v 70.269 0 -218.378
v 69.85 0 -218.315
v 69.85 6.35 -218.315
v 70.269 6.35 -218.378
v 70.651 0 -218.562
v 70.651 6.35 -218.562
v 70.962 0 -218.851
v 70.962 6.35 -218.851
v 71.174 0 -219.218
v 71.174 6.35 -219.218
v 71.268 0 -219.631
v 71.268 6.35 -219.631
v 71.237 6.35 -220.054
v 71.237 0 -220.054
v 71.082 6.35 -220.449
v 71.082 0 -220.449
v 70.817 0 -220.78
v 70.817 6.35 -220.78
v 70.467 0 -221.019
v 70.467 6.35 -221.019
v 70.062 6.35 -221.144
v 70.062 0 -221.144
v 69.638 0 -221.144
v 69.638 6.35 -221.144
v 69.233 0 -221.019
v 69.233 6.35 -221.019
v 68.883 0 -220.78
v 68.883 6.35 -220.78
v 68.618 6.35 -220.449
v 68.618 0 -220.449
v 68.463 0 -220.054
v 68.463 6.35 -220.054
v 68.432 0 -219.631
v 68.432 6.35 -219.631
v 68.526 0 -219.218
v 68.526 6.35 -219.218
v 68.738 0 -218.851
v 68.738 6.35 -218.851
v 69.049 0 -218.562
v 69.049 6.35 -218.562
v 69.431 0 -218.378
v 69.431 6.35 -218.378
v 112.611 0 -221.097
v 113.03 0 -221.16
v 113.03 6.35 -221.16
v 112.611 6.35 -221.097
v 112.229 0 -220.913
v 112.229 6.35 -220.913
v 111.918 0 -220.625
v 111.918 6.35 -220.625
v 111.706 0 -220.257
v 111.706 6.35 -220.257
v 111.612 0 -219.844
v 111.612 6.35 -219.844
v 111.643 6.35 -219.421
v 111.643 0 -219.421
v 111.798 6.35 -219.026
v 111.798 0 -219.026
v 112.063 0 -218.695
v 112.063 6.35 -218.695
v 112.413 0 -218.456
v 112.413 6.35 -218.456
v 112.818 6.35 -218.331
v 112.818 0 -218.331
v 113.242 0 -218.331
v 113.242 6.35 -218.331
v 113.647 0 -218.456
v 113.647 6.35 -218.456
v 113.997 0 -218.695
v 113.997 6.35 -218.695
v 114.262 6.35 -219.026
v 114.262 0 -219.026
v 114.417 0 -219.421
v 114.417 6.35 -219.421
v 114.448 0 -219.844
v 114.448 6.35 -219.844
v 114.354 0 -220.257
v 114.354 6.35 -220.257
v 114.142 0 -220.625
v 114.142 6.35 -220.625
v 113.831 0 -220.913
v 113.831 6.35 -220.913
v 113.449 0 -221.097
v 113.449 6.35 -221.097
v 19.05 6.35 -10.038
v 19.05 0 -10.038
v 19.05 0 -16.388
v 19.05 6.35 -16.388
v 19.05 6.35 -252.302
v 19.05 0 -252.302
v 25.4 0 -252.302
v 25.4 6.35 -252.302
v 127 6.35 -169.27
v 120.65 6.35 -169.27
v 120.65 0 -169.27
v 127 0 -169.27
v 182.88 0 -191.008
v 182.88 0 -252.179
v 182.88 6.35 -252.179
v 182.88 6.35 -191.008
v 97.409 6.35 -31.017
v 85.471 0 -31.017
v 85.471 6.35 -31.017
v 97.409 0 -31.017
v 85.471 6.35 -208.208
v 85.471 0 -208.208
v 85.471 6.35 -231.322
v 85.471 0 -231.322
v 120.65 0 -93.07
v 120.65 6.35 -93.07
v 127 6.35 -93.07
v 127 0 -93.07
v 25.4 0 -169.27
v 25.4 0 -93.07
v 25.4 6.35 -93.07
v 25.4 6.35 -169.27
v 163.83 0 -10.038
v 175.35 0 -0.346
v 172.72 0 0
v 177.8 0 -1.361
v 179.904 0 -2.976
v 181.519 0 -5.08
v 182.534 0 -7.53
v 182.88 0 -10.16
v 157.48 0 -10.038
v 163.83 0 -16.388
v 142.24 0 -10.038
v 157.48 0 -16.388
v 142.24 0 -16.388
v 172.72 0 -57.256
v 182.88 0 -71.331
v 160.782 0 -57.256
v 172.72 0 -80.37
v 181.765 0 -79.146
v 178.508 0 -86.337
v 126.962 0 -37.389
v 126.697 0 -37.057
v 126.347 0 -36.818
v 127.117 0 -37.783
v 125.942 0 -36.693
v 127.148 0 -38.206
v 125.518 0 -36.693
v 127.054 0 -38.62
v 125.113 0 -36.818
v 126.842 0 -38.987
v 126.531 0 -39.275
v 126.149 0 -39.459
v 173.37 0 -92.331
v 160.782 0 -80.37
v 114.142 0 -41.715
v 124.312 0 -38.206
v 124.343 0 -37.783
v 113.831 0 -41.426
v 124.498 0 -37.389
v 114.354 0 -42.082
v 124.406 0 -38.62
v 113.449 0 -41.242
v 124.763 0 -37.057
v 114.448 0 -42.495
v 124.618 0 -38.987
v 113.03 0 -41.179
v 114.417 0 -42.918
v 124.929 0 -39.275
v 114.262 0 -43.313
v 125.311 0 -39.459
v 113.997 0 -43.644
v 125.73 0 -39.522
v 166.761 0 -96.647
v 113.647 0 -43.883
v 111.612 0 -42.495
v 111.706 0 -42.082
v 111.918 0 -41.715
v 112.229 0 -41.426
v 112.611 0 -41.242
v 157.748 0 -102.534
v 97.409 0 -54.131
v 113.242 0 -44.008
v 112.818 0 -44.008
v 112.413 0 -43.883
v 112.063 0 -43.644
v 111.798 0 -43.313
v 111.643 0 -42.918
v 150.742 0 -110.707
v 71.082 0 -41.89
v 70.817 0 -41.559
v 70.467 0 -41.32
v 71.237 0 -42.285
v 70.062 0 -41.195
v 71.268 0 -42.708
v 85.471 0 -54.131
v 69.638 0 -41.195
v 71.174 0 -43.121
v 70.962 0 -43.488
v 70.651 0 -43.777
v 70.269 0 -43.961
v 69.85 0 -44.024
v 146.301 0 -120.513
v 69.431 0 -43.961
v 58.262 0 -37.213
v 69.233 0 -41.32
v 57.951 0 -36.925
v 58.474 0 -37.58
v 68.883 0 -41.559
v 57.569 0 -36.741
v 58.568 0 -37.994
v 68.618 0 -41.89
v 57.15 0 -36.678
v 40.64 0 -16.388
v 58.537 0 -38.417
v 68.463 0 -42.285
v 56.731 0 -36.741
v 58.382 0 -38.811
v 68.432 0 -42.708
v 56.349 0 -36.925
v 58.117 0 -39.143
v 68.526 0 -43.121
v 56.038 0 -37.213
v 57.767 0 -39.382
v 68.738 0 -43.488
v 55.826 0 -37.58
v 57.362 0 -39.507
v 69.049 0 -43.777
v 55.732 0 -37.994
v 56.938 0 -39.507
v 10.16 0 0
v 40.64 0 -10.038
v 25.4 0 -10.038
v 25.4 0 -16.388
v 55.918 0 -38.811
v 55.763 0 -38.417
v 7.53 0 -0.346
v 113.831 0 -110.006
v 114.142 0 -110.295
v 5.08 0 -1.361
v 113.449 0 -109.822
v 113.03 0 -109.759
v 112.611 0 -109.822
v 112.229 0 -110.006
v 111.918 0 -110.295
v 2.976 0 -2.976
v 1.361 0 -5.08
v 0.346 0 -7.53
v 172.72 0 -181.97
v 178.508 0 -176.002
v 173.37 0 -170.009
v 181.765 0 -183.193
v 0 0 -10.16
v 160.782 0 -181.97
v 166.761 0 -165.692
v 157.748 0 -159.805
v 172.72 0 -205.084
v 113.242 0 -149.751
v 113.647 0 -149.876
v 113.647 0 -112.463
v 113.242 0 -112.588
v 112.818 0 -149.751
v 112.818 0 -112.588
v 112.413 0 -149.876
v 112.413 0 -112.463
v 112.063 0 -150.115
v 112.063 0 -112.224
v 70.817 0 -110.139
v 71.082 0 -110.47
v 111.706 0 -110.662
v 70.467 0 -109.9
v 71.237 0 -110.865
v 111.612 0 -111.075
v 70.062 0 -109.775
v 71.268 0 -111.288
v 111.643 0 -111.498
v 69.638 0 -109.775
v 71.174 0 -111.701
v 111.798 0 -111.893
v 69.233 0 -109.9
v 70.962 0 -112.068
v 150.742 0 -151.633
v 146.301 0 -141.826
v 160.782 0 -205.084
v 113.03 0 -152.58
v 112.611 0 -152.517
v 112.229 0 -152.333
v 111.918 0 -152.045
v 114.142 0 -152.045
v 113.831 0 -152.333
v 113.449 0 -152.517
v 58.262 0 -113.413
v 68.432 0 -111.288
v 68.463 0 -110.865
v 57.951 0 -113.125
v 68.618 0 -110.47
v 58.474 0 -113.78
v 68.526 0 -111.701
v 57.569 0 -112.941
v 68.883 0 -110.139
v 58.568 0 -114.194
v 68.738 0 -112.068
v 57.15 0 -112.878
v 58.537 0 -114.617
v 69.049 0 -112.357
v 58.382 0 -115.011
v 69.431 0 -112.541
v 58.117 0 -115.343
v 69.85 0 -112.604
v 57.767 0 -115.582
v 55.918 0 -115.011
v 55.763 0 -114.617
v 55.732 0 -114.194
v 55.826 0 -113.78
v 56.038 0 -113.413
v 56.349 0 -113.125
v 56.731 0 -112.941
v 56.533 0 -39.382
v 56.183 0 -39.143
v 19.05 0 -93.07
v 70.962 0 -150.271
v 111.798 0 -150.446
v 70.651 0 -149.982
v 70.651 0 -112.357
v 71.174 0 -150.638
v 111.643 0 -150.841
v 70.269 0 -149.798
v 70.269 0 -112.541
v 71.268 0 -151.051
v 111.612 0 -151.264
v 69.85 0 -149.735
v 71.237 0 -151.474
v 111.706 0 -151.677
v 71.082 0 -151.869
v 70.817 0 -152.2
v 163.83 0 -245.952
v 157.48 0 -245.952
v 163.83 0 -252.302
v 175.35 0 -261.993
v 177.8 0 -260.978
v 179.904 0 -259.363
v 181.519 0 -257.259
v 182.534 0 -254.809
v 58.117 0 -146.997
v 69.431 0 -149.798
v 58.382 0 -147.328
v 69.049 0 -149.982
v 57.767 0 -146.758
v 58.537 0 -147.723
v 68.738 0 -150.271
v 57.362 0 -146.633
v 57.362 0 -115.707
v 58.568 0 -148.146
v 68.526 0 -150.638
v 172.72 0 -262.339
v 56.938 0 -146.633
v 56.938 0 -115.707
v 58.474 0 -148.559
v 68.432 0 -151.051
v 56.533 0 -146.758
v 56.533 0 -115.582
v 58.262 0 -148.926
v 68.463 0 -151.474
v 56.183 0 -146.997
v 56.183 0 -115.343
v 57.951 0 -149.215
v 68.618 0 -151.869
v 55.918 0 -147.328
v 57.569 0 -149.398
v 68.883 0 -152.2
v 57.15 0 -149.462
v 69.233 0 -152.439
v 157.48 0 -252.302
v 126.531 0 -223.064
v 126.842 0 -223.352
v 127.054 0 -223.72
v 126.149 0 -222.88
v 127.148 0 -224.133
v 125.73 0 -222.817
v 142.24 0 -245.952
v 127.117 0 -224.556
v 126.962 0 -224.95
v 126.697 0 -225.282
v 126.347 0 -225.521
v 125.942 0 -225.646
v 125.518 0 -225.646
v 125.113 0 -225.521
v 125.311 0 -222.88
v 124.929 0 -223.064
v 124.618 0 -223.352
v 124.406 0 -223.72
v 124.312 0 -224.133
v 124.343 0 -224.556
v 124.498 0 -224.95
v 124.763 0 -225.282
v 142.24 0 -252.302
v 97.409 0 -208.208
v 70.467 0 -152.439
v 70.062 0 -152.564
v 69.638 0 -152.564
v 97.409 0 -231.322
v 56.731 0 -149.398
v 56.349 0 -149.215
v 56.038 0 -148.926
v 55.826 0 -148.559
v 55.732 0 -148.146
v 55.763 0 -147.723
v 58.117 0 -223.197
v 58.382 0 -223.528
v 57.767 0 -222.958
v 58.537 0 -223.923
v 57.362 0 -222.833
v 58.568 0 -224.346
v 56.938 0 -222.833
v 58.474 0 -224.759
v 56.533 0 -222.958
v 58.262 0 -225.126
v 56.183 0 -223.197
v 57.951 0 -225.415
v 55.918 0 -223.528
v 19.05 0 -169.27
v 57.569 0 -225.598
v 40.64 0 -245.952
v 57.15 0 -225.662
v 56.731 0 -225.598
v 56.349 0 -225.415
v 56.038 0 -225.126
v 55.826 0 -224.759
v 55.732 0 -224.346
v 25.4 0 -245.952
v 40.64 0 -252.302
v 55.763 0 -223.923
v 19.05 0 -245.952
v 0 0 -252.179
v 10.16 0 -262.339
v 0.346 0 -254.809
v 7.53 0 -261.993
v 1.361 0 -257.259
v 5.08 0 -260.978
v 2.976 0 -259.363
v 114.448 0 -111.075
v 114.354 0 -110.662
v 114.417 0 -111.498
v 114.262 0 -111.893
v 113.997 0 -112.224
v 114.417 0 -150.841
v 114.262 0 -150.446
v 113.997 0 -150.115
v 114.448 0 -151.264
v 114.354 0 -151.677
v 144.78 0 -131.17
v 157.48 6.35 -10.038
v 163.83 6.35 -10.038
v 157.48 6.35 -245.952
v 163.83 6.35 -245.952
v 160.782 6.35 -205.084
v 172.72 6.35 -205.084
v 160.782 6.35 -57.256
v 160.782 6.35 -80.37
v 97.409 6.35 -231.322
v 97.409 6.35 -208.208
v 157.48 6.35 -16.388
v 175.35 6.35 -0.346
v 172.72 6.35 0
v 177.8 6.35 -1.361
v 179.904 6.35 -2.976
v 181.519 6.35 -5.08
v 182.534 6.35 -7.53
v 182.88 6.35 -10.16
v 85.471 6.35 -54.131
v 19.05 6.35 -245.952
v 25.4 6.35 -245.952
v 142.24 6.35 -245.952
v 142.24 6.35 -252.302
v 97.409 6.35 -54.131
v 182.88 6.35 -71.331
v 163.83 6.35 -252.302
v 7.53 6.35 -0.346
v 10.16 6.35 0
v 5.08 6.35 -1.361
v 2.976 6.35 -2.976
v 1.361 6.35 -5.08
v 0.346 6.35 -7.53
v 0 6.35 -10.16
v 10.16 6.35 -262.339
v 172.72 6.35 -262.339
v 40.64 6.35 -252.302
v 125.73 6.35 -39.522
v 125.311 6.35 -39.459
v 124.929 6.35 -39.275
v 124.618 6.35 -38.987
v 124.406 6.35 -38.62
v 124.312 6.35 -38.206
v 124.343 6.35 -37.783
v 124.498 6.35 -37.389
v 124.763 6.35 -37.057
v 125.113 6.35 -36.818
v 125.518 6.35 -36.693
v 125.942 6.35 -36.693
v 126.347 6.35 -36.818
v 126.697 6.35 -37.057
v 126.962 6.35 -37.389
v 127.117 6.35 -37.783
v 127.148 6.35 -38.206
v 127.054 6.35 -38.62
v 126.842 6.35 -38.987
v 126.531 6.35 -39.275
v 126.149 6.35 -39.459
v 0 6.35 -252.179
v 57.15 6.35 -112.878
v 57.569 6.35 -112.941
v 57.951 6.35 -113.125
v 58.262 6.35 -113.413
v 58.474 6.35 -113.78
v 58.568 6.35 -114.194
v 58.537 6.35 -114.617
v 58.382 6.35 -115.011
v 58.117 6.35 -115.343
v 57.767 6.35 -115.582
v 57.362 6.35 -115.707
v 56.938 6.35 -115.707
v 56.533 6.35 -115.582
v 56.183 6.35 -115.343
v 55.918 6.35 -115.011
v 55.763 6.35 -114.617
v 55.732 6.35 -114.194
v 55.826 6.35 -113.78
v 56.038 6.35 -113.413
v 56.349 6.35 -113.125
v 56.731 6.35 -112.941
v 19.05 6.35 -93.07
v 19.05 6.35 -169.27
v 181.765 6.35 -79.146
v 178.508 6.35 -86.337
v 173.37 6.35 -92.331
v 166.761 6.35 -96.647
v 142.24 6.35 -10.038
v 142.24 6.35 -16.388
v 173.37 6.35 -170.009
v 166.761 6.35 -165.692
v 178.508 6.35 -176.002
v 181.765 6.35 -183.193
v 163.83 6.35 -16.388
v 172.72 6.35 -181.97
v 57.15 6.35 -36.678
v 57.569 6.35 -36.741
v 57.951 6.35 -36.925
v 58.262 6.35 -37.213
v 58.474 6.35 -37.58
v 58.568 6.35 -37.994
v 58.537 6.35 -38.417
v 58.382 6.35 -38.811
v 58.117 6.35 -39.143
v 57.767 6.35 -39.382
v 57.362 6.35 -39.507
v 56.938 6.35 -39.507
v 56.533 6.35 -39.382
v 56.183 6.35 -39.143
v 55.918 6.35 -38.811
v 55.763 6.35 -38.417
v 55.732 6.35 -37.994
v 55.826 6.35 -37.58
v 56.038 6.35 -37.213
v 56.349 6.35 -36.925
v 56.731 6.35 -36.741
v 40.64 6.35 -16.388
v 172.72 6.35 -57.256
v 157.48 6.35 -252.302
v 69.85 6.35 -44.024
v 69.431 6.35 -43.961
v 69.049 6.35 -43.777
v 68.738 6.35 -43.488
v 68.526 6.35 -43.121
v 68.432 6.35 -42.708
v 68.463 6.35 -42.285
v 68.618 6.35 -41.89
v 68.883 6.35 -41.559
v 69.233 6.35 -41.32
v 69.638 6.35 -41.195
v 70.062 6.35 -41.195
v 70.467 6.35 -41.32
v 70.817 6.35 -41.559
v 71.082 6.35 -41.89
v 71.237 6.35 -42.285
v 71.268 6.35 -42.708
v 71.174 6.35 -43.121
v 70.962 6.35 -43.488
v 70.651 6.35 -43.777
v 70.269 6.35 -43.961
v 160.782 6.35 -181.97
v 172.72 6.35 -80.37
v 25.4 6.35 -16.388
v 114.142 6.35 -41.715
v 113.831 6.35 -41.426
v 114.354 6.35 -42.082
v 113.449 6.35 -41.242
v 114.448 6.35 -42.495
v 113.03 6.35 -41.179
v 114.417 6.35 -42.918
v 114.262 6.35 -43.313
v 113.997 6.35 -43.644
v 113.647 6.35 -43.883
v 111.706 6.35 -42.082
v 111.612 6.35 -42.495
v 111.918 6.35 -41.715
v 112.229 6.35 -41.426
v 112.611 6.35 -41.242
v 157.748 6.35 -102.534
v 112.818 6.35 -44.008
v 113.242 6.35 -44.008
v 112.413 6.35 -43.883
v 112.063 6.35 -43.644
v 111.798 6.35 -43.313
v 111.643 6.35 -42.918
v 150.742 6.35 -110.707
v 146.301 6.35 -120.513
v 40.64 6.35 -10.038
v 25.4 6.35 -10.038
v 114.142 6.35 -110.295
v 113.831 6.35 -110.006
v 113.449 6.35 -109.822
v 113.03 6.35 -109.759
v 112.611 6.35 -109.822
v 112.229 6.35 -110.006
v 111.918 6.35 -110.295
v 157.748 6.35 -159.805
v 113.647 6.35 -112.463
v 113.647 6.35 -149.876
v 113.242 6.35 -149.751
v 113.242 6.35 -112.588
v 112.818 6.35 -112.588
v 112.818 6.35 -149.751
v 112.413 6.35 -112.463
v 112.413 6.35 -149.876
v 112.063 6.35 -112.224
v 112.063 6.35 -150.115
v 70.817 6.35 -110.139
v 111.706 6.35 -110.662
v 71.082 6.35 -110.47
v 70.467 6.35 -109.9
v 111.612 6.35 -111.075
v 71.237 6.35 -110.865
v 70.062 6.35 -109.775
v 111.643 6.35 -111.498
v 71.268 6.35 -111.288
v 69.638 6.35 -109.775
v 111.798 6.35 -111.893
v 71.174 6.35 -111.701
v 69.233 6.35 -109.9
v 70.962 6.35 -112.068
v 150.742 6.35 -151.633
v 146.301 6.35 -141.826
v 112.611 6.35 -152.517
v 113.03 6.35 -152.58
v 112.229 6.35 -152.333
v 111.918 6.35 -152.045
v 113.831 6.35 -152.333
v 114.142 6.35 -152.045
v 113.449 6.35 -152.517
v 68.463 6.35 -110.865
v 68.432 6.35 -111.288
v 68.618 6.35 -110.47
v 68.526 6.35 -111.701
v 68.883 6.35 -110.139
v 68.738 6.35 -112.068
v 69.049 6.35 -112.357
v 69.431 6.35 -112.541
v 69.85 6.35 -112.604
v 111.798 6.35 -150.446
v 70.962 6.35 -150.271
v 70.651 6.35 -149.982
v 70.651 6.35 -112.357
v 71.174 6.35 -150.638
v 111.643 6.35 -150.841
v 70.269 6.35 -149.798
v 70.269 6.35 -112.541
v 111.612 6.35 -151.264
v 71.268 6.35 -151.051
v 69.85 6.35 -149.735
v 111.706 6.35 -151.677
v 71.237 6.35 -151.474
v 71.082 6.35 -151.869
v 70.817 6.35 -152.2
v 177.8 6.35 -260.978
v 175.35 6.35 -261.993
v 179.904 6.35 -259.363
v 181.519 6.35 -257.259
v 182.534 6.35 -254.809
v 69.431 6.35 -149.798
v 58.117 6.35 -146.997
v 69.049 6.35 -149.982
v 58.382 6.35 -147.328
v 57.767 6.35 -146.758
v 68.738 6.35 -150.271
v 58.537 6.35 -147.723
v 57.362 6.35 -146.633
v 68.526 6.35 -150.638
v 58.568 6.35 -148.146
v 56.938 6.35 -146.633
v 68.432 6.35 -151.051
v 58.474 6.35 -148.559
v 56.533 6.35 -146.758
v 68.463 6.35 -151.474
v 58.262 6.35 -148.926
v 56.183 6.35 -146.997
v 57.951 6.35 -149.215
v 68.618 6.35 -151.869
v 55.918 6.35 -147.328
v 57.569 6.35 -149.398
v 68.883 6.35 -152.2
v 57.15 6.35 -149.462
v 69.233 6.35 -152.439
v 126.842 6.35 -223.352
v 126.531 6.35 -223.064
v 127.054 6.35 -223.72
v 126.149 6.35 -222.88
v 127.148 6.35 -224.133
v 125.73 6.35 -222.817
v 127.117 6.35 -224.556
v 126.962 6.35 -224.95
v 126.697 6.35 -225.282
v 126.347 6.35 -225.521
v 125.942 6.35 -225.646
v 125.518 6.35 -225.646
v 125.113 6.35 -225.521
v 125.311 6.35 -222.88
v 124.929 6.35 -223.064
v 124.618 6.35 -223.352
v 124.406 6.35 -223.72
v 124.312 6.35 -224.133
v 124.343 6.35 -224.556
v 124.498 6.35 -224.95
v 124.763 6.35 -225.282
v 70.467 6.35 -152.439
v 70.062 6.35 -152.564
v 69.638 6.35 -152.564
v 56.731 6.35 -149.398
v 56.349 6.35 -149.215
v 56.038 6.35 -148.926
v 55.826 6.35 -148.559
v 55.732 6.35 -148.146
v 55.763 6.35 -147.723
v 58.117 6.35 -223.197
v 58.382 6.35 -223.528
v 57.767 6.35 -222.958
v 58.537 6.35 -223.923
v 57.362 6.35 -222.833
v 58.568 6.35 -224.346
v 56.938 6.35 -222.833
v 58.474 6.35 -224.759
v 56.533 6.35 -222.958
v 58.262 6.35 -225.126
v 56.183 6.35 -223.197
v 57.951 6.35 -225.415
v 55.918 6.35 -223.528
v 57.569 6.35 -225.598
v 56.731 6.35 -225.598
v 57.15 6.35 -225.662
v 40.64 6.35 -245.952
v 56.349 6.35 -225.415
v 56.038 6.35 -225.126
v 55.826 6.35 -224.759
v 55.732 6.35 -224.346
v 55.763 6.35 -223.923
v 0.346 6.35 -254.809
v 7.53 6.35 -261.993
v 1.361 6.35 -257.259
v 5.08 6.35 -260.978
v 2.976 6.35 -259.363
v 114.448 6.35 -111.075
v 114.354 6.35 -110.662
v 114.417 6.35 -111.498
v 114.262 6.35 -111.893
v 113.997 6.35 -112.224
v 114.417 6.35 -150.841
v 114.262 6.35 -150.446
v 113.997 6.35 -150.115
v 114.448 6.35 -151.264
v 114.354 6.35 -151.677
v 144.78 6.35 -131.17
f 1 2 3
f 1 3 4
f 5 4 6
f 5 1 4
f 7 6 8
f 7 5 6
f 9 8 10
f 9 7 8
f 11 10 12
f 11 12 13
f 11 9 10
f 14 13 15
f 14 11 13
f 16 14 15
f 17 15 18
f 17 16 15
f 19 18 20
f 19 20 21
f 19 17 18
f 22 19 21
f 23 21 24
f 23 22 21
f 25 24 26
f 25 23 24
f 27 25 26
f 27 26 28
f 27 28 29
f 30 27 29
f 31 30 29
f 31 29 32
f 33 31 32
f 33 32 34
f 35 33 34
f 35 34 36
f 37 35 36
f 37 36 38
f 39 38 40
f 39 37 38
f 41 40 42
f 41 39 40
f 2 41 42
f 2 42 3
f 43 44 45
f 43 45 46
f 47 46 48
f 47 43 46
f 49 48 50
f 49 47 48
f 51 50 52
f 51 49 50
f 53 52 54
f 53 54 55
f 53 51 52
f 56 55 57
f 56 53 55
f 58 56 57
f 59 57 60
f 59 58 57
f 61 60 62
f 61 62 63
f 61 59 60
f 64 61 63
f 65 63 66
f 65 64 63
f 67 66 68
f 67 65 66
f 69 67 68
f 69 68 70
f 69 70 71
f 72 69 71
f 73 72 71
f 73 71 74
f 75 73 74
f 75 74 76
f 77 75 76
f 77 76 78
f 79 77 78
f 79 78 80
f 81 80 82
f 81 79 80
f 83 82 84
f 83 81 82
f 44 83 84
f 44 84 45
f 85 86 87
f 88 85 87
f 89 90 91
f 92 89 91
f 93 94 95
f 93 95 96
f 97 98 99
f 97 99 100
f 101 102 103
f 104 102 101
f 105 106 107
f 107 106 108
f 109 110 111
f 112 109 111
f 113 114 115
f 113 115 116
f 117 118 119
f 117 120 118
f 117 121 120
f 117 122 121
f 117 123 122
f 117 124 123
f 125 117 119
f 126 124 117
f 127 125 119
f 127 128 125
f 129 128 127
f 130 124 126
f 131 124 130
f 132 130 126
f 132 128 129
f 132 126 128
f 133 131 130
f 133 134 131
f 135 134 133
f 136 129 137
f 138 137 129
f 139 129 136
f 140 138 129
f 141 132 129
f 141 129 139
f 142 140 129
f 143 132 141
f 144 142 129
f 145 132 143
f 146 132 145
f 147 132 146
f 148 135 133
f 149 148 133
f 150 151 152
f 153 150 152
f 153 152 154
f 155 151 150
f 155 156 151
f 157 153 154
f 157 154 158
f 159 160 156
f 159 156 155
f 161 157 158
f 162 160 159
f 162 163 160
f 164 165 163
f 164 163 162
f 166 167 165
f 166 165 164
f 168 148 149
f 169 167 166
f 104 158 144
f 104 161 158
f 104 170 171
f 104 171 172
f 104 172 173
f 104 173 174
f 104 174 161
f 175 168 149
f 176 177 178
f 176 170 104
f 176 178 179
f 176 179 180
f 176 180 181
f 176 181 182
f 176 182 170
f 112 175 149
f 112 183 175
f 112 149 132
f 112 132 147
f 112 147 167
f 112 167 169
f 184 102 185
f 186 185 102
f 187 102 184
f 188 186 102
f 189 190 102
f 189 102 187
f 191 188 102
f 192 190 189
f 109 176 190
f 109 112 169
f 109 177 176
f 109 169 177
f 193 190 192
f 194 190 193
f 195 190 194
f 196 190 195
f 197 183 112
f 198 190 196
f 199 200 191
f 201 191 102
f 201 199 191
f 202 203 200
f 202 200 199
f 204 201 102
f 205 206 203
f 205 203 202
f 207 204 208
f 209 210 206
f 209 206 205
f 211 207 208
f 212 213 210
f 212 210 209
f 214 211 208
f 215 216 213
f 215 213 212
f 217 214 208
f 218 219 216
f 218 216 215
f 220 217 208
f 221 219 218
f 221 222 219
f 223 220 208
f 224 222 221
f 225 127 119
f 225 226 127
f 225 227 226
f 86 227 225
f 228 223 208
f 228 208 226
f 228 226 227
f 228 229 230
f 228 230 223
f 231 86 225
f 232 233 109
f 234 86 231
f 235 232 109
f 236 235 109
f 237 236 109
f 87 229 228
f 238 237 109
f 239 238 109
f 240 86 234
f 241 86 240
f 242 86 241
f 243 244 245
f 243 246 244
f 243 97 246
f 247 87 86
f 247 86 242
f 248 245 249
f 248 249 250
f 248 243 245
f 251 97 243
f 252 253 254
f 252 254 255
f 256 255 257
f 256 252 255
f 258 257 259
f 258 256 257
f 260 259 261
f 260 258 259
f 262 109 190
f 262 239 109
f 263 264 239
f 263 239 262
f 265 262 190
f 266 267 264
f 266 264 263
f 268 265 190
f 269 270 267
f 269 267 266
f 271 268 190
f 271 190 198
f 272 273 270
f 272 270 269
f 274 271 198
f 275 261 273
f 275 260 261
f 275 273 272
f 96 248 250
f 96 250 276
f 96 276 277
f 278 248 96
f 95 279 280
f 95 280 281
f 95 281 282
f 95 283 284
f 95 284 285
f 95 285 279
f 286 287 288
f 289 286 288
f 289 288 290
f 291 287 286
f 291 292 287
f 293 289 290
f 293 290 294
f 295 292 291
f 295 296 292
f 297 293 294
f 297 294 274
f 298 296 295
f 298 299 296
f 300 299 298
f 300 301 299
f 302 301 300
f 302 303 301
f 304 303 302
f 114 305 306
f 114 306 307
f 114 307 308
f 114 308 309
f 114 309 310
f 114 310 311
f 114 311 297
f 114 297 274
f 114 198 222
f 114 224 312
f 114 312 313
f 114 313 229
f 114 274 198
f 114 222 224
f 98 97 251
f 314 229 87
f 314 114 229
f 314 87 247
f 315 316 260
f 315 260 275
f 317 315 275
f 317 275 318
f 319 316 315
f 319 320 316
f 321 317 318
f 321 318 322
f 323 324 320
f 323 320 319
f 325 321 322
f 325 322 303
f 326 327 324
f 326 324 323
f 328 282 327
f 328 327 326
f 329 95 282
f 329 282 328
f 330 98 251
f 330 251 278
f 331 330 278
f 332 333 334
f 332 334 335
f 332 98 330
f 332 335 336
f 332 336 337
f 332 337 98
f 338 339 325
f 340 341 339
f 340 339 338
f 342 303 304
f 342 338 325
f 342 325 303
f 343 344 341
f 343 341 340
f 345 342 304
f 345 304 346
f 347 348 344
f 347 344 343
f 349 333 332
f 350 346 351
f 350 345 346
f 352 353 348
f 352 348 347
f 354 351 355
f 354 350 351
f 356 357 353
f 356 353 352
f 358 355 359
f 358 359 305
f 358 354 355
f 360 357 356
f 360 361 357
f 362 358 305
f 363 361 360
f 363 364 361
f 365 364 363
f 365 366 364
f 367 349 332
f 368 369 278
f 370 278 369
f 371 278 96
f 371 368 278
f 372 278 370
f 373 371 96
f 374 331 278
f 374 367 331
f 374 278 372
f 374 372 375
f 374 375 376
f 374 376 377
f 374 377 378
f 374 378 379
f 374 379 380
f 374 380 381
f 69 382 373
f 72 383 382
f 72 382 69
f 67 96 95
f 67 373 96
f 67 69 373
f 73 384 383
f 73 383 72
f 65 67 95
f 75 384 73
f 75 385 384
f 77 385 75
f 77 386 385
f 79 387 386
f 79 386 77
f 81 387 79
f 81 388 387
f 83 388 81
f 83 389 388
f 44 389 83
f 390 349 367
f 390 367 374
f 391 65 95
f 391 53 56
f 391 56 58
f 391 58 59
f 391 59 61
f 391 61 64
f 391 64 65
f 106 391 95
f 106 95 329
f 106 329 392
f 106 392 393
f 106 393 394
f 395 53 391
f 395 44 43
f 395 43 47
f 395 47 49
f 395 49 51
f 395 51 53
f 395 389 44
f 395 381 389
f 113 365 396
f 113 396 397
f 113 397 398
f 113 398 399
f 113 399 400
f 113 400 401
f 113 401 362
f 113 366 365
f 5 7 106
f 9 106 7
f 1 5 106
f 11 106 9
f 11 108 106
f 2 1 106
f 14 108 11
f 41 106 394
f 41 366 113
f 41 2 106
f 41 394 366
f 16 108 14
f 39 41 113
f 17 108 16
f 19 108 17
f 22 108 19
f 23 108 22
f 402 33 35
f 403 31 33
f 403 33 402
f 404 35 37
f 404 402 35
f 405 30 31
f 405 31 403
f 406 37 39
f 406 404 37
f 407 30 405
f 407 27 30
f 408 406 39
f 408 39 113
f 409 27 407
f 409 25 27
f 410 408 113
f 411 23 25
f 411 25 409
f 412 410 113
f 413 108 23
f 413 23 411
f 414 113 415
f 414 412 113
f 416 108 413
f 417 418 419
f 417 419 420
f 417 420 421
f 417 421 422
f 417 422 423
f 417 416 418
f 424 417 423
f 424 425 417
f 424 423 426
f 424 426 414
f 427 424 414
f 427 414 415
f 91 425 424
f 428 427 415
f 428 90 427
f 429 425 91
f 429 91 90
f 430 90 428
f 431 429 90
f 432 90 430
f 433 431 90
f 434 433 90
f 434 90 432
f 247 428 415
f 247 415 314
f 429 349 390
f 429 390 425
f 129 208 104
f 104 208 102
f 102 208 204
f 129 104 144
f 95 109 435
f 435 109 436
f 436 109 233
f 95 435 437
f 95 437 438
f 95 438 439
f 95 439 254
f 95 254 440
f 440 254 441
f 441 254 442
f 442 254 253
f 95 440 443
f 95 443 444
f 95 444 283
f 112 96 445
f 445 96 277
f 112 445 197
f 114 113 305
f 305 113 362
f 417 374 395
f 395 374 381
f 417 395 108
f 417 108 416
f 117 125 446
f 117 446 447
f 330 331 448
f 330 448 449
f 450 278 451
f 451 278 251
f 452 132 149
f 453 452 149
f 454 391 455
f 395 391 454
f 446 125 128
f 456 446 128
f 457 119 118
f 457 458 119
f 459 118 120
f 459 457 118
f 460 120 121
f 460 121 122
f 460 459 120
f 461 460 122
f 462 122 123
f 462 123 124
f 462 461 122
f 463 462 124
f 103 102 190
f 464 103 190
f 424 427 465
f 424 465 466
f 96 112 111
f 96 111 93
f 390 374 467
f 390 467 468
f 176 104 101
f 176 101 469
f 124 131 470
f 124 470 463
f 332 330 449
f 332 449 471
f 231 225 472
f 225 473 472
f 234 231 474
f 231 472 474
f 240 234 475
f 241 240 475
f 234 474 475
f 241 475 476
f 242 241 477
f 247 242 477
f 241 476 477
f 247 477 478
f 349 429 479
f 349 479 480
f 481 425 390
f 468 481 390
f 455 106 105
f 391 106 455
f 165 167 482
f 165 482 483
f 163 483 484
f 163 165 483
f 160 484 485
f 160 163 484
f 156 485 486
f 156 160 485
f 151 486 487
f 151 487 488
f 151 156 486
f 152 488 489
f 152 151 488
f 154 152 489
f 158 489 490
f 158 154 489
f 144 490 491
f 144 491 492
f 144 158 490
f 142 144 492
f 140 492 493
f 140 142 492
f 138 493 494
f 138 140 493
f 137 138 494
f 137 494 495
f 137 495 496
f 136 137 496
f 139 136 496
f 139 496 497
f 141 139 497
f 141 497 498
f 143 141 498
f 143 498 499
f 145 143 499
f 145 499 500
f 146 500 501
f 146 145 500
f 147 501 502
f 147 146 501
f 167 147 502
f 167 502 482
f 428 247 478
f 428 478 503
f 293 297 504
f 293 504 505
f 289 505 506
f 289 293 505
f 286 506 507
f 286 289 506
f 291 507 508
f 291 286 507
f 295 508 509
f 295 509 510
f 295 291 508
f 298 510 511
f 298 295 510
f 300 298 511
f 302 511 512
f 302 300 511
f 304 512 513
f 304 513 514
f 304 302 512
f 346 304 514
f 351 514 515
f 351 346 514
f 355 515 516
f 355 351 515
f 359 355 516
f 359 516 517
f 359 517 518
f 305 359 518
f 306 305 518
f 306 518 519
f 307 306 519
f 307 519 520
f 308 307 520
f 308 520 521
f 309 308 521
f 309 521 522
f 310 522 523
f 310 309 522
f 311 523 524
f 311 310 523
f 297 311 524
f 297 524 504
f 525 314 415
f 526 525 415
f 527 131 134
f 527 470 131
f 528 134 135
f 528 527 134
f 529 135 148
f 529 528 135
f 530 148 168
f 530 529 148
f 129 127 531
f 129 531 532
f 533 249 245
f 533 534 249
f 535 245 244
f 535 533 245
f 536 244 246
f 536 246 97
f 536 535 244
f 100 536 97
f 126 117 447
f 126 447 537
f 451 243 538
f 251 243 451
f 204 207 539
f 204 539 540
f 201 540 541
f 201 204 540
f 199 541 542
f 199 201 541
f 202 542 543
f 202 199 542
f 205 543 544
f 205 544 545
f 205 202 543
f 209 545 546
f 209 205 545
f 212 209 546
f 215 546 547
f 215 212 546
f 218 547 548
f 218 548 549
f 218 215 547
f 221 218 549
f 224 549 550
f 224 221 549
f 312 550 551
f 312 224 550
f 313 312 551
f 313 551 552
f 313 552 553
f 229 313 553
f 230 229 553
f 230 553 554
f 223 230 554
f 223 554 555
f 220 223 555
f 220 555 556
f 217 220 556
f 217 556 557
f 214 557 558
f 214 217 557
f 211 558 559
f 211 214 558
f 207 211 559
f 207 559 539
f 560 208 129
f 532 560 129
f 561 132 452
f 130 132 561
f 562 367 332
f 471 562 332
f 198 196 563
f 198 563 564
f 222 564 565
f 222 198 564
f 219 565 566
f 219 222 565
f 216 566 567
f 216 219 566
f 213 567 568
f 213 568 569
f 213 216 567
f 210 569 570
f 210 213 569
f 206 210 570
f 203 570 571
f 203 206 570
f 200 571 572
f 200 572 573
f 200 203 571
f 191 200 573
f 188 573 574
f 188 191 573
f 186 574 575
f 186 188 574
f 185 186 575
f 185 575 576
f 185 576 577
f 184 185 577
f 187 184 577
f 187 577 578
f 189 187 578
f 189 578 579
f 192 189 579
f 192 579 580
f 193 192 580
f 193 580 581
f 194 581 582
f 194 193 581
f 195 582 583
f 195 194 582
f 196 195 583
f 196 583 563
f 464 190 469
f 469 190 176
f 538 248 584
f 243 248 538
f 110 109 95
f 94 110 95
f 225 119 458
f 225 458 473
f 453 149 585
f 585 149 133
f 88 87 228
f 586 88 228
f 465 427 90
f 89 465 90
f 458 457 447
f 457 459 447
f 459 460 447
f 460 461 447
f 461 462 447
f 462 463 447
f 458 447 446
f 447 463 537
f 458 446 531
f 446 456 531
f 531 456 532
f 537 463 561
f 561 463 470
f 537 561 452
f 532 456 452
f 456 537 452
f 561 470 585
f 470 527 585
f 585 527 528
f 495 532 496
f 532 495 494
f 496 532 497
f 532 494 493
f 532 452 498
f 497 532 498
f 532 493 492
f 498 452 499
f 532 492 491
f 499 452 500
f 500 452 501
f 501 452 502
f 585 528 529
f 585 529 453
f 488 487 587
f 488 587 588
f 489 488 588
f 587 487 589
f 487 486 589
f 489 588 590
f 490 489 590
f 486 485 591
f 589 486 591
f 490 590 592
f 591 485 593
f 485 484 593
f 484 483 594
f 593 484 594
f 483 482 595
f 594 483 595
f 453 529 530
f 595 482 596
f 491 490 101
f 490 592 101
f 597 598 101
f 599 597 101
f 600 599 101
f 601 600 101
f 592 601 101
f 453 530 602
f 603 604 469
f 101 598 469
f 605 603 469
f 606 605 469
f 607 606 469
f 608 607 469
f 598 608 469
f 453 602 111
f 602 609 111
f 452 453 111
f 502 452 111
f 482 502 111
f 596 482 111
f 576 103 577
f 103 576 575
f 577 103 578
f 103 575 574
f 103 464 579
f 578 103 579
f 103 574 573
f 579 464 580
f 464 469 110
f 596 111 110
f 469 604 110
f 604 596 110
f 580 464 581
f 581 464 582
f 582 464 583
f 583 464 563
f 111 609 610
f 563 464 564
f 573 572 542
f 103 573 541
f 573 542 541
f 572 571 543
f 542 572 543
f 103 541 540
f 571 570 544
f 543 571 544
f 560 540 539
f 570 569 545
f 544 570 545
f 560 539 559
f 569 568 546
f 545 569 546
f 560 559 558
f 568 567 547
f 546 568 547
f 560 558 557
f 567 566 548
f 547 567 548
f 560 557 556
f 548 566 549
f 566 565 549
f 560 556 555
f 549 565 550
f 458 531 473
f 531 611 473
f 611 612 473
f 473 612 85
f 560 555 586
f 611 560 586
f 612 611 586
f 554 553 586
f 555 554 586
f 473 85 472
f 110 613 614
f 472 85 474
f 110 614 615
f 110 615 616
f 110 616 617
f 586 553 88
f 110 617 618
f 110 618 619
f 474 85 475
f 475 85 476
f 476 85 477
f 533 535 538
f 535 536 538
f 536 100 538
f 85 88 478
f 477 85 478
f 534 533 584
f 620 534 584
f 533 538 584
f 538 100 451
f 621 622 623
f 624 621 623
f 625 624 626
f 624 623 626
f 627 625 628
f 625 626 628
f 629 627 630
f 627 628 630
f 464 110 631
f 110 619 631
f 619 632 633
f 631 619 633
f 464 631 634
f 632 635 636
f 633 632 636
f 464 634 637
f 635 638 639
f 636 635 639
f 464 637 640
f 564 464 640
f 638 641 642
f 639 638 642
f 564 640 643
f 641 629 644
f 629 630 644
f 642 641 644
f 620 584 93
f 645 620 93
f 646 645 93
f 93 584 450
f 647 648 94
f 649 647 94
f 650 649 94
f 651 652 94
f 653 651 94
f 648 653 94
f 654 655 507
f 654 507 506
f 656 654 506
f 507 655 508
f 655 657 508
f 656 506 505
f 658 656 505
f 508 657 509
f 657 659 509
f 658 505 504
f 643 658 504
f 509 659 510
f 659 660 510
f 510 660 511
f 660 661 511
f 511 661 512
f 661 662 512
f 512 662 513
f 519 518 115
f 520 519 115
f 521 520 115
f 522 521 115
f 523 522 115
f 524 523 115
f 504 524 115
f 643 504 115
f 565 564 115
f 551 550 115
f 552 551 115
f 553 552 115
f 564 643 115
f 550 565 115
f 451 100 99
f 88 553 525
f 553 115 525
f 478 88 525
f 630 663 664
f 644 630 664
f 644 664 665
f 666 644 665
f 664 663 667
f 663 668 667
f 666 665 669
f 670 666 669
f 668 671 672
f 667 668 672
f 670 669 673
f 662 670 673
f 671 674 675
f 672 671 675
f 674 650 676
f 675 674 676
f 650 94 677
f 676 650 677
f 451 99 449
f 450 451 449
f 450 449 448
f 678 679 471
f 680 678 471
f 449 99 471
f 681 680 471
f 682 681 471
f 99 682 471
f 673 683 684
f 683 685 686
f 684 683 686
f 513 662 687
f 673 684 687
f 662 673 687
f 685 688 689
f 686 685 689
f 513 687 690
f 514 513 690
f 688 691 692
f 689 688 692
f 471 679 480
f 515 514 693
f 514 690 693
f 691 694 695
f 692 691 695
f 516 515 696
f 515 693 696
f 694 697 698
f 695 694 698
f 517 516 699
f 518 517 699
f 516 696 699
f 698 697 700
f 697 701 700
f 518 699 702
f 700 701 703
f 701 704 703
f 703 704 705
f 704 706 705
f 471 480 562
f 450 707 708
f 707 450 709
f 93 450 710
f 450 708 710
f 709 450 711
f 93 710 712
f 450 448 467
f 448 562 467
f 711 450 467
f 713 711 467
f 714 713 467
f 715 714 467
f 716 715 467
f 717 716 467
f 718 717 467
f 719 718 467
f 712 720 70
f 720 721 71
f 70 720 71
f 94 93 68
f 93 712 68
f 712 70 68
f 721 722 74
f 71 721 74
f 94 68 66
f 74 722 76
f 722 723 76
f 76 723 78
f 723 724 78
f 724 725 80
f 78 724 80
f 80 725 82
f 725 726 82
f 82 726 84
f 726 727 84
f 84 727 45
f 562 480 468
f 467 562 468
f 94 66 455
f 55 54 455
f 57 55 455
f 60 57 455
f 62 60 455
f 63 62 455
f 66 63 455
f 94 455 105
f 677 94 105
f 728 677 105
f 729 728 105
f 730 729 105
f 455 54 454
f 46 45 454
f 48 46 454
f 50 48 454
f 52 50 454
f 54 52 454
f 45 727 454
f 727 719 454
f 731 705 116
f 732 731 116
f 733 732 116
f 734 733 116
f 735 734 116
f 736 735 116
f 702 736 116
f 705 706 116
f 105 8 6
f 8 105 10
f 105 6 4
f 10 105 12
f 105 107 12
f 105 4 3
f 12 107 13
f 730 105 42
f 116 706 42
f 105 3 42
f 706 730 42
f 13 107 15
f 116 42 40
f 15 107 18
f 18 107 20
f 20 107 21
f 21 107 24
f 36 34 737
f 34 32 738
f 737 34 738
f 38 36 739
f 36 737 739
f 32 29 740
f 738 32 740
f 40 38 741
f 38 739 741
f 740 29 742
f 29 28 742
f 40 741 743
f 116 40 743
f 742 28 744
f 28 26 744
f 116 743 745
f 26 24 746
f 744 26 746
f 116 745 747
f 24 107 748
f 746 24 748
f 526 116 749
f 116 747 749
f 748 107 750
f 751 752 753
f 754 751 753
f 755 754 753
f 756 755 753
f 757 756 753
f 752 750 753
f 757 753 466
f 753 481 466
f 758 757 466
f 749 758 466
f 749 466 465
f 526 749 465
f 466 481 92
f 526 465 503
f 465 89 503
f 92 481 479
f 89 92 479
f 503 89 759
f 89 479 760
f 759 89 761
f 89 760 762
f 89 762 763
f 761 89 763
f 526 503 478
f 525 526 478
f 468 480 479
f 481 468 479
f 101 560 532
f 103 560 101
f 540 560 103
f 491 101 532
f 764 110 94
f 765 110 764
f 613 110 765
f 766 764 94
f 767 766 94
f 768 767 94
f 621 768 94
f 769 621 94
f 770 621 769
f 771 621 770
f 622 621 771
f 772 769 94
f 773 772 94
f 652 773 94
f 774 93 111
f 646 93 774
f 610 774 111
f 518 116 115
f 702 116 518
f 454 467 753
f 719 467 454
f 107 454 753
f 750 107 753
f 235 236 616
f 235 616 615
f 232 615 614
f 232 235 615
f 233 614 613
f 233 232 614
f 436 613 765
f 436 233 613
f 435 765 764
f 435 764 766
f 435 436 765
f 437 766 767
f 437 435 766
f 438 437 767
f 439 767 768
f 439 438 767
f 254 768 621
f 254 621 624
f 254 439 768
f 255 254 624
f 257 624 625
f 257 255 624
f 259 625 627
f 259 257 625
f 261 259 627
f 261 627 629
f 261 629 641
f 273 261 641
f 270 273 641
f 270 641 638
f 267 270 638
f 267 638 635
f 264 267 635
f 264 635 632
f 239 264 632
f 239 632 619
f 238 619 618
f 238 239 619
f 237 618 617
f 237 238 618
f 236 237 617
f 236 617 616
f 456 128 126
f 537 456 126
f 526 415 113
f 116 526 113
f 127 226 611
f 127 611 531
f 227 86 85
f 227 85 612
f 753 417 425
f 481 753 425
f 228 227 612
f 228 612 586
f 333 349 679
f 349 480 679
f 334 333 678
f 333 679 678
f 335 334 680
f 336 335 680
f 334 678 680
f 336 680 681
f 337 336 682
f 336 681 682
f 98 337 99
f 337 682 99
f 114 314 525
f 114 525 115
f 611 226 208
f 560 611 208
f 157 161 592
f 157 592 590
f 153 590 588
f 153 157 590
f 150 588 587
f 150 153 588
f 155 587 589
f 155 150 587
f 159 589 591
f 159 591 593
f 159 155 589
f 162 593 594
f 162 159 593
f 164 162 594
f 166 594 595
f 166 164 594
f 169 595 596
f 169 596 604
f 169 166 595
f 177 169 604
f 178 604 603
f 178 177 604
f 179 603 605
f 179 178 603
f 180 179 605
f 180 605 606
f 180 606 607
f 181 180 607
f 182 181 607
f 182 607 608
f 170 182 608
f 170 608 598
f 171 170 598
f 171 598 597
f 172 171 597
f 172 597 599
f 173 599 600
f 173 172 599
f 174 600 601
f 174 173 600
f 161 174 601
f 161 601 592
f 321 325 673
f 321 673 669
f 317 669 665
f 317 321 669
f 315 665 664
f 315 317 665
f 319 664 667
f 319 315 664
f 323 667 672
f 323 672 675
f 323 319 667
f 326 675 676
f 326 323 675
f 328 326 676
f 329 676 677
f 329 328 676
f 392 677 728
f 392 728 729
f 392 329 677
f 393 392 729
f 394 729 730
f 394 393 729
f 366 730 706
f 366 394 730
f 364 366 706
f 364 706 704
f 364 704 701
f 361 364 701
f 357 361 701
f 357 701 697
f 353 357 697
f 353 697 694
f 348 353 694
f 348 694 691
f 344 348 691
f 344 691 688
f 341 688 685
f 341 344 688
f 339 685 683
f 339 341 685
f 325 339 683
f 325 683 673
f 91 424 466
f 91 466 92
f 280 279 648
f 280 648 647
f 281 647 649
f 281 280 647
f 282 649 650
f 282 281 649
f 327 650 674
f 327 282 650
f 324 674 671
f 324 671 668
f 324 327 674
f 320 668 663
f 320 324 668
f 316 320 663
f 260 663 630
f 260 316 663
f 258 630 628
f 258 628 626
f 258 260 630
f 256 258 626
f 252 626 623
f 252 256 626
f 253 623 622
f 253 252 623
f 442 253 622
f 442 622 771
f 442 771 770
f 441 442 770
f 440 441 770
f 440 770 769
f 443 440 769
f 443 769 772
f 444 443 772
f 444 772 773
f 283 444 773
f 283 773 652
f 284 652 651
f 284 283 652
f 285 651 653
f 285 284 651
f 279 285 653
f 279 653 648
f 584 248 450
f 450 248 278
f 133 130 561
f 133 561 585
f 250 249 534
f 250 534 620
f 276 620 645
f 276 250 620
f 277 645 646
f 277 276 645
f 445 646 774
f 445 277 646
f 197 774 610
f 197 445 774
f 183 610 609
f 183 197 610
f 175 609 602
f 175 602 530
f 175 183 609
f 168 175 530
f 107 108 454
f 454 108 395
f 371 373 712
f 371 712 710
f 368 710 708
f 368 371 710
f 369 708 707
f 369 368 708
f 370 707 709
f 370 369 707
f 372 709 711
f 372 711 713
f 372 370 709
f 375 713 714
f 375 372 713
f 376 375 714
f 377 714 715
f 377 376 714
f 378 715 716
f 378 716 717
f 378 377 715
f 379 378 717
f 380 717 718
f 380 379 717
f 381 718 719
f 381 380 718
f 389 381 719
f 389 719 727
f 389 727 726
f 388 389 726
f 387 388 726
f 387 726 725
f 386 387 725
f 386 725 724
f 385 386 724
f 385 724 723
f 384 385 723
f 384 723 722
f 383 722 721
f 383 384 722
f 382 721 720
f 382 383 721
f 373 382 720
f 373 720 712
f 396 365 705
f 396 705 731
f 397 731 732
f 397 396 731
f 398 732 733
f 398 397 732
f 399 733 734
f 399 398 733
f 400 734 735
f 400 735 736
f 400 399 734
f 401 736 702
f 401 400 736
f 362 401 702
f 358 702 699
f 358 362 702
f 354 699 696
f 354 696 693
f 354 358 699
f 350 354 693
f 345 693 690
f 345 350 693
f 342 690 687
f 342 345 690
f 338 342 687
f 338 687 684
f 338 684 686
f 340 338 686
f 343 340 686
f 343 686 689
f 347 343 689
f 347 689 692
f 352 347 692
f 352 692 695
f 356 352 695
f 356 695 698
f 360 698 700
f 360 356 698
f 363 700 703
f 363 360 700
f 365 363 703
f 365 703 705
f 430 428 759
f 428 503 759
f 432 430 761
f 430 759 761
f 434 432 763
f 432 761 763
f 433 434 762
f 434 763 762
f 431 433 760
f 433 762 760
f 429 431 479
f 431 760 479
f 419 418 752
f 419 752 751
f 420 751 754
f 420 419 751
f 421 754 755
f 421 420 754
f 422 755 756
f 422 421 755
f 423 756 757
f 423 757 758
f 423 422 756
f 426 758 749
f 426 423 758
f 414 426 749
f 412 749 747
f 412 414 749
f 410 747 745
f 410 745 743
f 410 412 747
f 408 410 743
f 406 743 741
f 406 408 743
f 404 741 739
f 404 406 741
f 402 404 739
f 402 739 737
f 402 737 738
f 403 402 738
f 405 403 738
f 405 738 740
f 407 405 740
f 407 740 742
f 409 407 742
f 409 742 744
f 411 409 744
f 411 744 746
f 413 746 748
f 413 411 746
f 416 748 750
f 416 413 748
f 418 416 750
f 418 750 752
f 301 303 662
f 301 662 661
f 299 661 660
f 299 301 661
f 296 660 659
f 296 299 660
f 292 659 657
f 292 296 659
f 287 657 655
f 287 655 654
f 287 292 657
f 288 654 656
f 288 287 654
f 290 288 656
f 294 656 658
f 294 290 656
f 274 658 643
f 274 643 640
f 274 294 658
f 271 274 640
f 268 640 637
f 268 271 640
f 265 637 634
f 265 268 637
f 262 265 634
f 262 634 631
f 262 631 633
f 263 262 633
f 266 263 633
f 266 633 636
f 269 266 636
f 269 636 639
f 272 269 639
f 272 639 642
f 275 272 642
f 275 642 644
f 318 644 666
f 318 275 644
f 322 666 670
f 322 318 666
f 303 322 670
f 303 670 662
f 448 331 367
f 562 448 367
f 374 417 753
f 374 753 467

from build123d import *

# Parameters (mm, degrees)
SKETCH3_R           = 1.4224
SKETCH3_W           = 6.35
SKETCH3_H           = 6.35
SKETCH3_W_2         = 11.938
SKETCH3_H_2         = 23.114
SKETCH3_W_3         = 101.6
SKETCH3_H_3         = 76.2
BOSS_EXTRUDE1_DEPTH = 6.35
FILLET1_R           = 10.16
FILLET2_R           = 27.94


with BuildPart() as part:
    # Sketch3 → Boss-Extrude1 (new body)
    with BuildSketch(Plane(origin=(0, 0, 0), x_dir=(1, 0, 0), z_dir=(0, 1, 0))):
        with BuildLine():
            Line((182.88, 0), (0, 0))
            Line((0, 0), (0, 262.339276313))
            Line((0, 262.339276313), (182.88, 262.339276313))
            Line((182.88, 262.339276313), (182.88, 169.269638157))
            ThreePointArc((182.88, 169.269638157), (144.78, 131.169638157), (182.88, 93.069638157))
            Line((182.88, 93.069638157), (182.88, 0))
        make_face()
        with Locations(Location((57.15, 38.1, 0), (0, 0, 270))):
            Circle(SKETCH3_R, mode=Mode.SUBTRACT)
        with Locations(Location((57.15, 114.3, 0), (0, 0, 270))):
            Circle(SKETCH3_R, mode=Mode.SUBTRACT)
        with Locations(Location((125.73, 38.1, 0), (0, 0, 90))):
            Circle(SKETCH3_R, mode=Mode.SUBTRACT)
        with Locations(Location((69.85, 151.157668748, 0), (0, 0, 270))):
            Circle(SKETCH3_R, mode=Mode.SUBTRACT)
        with Locations(Location((69.85, 219.737668748, 0), (0, 0, 270))):
            Circle(SKETCH3_R, mode=Mode.SUBTRACT)
        with Locations(Location((113.03, 151.157668748, 0), (0, 0, 90))):
            Circle(SKETCH3_R, mode=Mode.SUBTRACT)
        with Locations(Location((113.03, 219.737668748, 0), (0, 0, 90))):
            Circle(SKETCH3_R, mode=Mode.SUBTRACT)
        with Locations(Location((113.03, 42.601607565, 0), (0, 0, 270))):
            Circle(SKETCH3_R, mode=Mode.SUBTRACT)
        with Locations(Location((113.03, 111.181607565, 0), (0, 0, 270))):
            Circle(SKETCH3_R, mode=Mode.SUBTRACT)
        with Locations(Location((69.85, 111.181607565, 0), (0, 0, 90))):
            Circle(SKETCH3_R, mode=Mode.SUBTRACT)
        with Locations(Location((69.85, 42.601607565, 0), (0, 0, 90))):
            Circle(SKETCH3_R, mode=Mode.SUBTRACT)
        with Locations(Location((125.73, 224.239276313, 0), (0, 0, 270))):
            Circle(SKETCH3_R, mode=Mode.SUBTRACT)
        with Locations(Location((57.15, 224.239276313, 0), (0, 0, 90))):
            Circle(SKETCH3_R, mode=Mode.SUBTRACT)
        with Locations(Location((57.15, 148.039276313, 0), (0, 0, 90))):
            Circle(SKETCH3_R, mode=Mode.SUBTRACT)
        with Locations((22.225, 13.212735966)):
            Rectangle(SKETCH3_W, SKETCH3_H, mode=Mode.SUBTRACT)
        with Locations((160.655, 13.212735966)):
            Rectangle(SKETCH3_W, SKETCH3_H, mode=Mode.SUBTRACT)
        with Locations((160.655, 249.126540348)):
            Rectangle(SKETCH3_W, SKETCH3_H, mode=Mode.SUBTRACT)
        with Locations((22.225, 249.126540348)):
            Rectangle(SKETCH3_W, SKETCH3_H, mode=Mode.SUBTRACT)
        with Locations((166.751, 193.526638157)):
            Rectangle(SKETCH3_W_2, SKETCH3_H_2, mode=Mode.SUBTRACT)
        with Locations((166.751, 68.812638157)):
            Rectangle(SKETCH3_W_2, SKETCH3_H_2, mode=Mode.SUBTRACT)
        with Locations((91.44, 249.126540348)):
            Rectangle(SKETCH3_W_3, SKETCH3_H, mode=Mode.SUBTRACT)
        with Locations((91.44, 13.212735966)):
            Rectangle(SKETCH3_W_3, SKETCH3_H, mode=Mode.SUBTRACT)
        with Locations((123.825, 131.169638157)):
            Rectangle(SKETCH3_W, SKETCH3_H_3, mode=Mode.SUBTRACT)
        with Locations((22.225, 131.169638157)):
            Rectangle(SKETCH3_W, SKETCH3_H_3, mode=Mode.SUBTRACT)
        with Locations((91.44, 42.57414812)):
            Rectangle(SKETCH3_W_2, SKETCH3_H_2, mode=Mode.SUBTRACT)
        with Locations((91.44, 219.765128193)):
            Rectangle(SKETCH3_W_2, SKETCH3_H_2, mode=Mode.SUBTRACT)
    extrude(amount=BOSS_EXTRUDE1_DEPTH)

    # Fillet1
    fillet1_edges = [part.edges().sort_by_distance(p)[0] for p in [
        (0, 3.175, -262.339276313),
        (182.88, 3.175, -262.339276313),
        (182.88, 3.175, 0),
        (0, 3.175, 0),
    ]]
    fillet(fillet1_edges, radius=FILLET1_R)

    # Fillet2
    fillet2_edges = [part.edges().sort_by_distance(p)[0] for p in [
        (182.88, 3.175, -169.269638157),
        (182.88, 3.175, -93.069638157),
    ]]
    fillet(fillet2_edges, radius=FILLET2_R)


solid = part.part
